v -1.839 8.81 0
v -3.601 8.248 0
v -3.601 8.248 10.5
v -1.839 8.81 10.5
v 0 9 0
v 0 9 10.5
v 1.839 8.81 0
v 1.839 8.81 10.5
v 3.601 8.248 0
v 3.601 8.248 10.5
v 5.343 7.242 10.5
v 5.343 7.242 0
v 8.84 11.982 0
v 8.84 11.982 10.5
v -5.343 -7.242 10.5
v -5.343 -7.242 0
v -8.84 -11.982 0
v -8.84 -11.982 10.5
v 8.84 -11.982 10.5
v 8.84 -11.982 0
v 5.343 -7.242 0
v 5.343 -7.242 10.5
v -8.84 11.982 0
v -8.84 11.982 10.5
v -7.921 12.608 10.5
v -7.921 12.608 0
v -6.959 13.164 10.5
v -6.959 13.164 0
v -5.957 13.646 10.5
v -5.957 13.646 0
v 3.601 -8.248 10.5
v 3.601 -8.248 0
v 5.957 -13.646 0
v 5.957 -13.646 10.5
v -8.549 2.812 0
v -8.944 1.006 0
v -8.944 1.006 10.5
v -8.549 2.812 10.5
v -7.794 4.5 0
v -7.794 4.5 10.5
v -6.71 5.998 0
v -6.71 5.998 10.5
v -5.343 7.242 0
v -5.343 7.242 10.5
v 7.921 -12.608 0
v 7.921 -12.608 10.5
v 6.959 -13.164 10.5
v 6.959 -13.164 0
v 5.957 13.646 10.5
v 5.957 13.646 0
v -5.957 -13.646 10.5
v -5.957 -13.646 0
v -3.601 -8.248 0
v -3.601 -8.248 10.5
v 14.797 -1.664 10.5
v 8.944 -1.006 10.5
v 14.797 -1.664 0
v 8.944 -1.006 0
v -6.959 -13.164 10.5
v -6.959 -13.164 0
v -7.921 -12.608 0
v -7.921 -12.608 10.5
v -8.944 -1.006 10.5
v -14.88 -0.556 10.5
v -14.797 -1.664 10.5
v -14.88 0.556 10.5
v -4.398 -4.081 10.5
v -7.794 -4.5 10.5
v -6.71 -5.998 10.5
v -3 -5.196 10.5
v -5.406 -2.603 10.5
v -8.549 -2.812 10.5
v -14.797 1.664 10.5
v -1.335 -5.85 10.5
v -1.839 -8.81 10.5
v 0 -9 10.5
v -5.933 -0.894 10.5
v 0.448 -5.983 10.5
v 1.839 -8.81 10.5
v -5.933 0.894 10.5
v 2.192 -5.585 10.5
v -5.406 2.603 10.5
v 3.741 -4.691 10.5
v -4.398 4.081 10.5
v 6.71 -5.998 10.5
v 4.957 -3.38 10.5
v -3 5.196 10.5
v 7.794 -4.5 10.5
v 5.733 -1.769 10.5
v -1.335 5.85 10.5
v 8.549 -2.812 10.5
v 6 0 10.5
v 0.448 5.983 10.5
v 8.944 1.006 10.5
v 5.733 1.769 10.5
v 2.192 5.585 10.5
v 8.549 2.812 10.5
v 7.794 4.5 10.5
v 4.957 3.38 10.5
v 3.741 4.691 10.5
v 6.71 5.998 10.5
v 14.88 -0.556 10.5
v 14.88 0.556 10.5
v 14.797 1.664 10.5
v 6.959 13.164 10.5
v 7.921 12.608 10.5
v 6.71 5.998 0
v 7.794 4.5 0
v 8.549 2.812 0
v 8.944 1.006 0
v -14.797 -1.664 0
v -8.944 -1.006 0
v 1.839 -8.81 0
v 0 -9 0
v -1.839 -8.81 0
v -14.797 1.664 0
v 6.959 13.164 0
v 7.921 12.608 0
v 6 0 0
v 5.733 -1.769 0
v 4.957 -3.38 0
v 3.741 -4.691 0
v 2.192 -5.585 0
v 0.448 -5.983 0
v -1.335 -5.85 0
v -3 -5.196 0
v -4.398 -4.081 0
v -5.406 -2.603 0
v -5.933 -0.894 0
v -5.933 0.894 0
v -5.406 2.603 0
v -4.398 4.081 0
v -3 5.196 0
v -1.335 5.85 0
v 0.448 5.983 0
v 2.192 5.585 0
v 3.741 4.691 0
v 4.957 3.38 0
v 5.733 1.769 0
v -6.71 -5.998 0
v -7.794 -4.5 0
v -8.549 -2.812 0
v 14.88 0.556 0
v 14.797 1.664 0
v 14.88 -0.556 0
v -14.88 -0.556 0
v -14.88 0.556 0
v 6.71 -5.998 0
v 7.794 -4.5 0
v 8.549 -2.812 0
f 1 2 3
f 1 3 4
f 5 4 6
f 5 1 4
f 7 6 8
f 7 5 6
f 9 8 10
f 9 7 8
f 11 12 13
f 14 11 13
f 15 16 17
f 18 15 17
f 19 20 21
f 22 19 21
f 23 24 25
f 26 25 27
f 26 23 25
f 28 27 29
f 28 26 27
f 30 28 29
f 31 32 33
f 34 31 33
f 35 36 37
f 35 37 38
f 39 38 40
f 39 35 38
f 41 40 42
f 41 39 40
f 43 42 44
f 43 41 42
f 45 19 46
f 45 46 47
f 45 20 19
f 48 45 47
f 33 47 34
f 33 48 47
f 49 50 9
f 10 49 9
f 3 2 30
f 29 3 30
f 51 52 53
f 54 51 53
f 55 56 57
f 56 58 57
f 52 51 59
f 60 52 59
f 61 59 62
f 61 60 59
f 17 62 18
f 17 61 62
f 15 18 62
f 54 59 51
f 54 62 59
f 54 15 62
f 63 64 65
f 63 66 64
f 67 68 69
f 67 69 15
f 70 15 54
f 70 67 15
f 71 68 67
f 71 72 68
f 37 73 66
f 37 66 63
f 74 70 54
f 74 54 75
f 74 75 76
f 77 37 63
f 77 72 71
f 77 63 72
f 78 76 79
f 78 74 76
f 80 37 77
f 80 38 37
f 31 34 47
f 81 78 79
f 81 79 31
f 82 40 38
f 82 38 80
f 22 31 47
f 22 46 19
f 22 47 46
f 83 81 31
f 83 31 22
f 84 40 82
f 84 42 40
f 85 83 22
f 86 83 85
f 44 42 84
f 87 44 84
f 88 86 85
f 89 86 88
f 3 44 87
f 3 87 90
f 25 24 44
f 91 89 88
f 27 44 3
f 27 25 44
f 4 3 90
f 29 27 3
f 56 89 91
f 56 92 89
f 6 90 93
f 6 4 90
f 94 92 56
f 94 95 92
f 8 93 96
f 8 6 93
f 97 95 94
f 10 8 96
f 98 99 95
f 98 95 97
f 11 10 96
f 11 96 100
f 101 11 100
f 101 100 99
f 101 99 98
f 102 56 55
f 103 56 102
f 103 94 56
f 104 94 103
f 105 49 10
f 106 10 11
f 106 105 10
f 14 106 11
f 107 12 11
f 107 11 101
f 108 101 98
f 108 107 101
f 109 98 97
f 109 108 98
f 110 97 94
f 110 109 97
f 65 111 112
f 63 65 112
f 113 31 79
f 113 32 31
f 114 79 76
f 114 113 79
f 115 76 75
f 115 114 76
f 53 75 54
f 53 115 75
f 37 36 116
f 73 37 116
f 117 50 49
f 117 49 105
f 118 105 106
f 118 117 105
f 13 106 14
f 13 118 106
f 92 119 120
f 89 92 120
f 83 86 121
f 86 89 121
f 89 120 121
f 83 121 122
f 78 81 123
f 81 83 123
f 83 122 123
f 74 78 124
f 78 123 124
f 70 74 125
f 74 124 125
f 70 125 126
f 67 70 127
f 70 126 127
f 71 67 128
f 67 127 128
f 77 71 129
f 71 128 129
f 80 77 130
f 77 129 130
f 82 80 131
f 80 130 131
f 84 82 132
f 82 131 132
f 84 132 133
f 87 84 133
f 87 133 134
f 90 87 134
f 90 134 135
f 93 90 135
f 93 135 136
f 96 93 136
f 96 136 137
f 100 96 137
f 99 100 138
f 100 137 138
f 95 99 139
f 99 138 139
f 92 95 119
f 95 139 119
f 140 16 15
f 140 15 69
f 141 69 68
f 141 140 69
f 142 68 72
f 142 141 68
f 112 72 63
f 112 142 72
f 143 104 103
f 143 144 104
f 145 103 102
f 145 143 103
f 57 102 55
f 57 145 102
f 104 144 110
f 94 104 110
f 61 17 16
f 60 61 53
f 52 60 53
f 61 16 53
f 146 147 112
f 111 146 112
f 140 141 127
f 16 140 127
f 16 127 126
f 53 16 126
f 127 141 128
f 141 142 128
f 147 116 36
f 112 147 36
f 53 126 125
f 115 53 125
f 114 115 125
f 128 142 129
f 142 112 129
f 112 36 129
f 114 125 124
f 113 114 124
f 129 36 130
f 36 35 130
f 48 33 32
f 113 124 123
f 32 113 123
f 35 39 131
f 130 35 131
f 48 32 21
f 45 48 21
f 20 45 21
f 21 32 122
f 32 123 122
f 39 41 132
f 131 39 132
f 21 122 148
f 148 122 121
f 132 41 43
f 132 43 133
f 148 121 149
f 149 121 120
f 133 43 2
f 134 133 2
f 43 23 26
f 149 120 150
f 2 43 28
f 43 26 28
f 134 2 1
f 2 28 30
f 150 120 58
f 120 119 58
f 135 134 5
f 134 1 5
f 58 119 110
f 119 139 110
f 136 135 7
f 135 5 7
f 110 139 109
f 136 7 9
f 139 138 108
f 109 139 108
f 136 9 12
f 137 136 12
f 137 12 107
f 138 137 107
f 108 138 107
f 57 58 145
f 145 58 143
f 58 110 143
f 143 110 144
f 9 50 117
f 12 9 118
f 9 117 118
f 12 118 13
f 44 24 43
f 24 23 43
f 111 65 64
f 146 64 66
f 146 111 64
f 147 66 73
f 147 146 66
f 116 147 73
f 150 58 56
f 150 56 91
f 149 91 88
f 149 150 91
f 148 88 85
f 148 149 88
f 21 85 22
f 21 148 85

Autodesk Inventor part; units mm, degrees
ref_plane "YZ Plane" through (0, 0, 0) normal (1, 0, 0) x (0, 1, 0)
ref_plane "XZ Plane" through (0, 0, 0) normal (0, 1, 0) x (-1, 0, 0)
ref_plane "XY Plane" through (0, 0, 0) normal (0, 0, 1) x (1, 0, 0)
sketch "Sketch2" plane through (0, 0, 0) normal (0, 0, 1) x (1, 0, 0)
  circle A0 centre (0, 0) radius 14.89
  circle A1 centre (0, 0) radius 9
  circle A2 centre (0, 0) radius 14.89
  line L0 (-3.6007, 8.2483) -> (-5.9571, 13.6464)
  line L1 (5.9571, 13.6464) -> (3.6007, 8.2483)
  circle A3 centre (0, 0) radius 6
  dimension "d10" = 18
  dimension "d12" = 12
extrude "Extrusion1" add sketch "Sketch2" along normal blind 10.5
extrude "Extrusion2" cut sketch "Sketch2" along normal blind 10.5 contours L1 A1 L0 A0 picked at (-1.0143, 12.8219)
pattern_circular "Circular Pattern1" count 6 over 360 about axis through (0, 0, -10) along (0, 0, 1) of "Extrusion2"
properties part number "CAO SU KHOP"
